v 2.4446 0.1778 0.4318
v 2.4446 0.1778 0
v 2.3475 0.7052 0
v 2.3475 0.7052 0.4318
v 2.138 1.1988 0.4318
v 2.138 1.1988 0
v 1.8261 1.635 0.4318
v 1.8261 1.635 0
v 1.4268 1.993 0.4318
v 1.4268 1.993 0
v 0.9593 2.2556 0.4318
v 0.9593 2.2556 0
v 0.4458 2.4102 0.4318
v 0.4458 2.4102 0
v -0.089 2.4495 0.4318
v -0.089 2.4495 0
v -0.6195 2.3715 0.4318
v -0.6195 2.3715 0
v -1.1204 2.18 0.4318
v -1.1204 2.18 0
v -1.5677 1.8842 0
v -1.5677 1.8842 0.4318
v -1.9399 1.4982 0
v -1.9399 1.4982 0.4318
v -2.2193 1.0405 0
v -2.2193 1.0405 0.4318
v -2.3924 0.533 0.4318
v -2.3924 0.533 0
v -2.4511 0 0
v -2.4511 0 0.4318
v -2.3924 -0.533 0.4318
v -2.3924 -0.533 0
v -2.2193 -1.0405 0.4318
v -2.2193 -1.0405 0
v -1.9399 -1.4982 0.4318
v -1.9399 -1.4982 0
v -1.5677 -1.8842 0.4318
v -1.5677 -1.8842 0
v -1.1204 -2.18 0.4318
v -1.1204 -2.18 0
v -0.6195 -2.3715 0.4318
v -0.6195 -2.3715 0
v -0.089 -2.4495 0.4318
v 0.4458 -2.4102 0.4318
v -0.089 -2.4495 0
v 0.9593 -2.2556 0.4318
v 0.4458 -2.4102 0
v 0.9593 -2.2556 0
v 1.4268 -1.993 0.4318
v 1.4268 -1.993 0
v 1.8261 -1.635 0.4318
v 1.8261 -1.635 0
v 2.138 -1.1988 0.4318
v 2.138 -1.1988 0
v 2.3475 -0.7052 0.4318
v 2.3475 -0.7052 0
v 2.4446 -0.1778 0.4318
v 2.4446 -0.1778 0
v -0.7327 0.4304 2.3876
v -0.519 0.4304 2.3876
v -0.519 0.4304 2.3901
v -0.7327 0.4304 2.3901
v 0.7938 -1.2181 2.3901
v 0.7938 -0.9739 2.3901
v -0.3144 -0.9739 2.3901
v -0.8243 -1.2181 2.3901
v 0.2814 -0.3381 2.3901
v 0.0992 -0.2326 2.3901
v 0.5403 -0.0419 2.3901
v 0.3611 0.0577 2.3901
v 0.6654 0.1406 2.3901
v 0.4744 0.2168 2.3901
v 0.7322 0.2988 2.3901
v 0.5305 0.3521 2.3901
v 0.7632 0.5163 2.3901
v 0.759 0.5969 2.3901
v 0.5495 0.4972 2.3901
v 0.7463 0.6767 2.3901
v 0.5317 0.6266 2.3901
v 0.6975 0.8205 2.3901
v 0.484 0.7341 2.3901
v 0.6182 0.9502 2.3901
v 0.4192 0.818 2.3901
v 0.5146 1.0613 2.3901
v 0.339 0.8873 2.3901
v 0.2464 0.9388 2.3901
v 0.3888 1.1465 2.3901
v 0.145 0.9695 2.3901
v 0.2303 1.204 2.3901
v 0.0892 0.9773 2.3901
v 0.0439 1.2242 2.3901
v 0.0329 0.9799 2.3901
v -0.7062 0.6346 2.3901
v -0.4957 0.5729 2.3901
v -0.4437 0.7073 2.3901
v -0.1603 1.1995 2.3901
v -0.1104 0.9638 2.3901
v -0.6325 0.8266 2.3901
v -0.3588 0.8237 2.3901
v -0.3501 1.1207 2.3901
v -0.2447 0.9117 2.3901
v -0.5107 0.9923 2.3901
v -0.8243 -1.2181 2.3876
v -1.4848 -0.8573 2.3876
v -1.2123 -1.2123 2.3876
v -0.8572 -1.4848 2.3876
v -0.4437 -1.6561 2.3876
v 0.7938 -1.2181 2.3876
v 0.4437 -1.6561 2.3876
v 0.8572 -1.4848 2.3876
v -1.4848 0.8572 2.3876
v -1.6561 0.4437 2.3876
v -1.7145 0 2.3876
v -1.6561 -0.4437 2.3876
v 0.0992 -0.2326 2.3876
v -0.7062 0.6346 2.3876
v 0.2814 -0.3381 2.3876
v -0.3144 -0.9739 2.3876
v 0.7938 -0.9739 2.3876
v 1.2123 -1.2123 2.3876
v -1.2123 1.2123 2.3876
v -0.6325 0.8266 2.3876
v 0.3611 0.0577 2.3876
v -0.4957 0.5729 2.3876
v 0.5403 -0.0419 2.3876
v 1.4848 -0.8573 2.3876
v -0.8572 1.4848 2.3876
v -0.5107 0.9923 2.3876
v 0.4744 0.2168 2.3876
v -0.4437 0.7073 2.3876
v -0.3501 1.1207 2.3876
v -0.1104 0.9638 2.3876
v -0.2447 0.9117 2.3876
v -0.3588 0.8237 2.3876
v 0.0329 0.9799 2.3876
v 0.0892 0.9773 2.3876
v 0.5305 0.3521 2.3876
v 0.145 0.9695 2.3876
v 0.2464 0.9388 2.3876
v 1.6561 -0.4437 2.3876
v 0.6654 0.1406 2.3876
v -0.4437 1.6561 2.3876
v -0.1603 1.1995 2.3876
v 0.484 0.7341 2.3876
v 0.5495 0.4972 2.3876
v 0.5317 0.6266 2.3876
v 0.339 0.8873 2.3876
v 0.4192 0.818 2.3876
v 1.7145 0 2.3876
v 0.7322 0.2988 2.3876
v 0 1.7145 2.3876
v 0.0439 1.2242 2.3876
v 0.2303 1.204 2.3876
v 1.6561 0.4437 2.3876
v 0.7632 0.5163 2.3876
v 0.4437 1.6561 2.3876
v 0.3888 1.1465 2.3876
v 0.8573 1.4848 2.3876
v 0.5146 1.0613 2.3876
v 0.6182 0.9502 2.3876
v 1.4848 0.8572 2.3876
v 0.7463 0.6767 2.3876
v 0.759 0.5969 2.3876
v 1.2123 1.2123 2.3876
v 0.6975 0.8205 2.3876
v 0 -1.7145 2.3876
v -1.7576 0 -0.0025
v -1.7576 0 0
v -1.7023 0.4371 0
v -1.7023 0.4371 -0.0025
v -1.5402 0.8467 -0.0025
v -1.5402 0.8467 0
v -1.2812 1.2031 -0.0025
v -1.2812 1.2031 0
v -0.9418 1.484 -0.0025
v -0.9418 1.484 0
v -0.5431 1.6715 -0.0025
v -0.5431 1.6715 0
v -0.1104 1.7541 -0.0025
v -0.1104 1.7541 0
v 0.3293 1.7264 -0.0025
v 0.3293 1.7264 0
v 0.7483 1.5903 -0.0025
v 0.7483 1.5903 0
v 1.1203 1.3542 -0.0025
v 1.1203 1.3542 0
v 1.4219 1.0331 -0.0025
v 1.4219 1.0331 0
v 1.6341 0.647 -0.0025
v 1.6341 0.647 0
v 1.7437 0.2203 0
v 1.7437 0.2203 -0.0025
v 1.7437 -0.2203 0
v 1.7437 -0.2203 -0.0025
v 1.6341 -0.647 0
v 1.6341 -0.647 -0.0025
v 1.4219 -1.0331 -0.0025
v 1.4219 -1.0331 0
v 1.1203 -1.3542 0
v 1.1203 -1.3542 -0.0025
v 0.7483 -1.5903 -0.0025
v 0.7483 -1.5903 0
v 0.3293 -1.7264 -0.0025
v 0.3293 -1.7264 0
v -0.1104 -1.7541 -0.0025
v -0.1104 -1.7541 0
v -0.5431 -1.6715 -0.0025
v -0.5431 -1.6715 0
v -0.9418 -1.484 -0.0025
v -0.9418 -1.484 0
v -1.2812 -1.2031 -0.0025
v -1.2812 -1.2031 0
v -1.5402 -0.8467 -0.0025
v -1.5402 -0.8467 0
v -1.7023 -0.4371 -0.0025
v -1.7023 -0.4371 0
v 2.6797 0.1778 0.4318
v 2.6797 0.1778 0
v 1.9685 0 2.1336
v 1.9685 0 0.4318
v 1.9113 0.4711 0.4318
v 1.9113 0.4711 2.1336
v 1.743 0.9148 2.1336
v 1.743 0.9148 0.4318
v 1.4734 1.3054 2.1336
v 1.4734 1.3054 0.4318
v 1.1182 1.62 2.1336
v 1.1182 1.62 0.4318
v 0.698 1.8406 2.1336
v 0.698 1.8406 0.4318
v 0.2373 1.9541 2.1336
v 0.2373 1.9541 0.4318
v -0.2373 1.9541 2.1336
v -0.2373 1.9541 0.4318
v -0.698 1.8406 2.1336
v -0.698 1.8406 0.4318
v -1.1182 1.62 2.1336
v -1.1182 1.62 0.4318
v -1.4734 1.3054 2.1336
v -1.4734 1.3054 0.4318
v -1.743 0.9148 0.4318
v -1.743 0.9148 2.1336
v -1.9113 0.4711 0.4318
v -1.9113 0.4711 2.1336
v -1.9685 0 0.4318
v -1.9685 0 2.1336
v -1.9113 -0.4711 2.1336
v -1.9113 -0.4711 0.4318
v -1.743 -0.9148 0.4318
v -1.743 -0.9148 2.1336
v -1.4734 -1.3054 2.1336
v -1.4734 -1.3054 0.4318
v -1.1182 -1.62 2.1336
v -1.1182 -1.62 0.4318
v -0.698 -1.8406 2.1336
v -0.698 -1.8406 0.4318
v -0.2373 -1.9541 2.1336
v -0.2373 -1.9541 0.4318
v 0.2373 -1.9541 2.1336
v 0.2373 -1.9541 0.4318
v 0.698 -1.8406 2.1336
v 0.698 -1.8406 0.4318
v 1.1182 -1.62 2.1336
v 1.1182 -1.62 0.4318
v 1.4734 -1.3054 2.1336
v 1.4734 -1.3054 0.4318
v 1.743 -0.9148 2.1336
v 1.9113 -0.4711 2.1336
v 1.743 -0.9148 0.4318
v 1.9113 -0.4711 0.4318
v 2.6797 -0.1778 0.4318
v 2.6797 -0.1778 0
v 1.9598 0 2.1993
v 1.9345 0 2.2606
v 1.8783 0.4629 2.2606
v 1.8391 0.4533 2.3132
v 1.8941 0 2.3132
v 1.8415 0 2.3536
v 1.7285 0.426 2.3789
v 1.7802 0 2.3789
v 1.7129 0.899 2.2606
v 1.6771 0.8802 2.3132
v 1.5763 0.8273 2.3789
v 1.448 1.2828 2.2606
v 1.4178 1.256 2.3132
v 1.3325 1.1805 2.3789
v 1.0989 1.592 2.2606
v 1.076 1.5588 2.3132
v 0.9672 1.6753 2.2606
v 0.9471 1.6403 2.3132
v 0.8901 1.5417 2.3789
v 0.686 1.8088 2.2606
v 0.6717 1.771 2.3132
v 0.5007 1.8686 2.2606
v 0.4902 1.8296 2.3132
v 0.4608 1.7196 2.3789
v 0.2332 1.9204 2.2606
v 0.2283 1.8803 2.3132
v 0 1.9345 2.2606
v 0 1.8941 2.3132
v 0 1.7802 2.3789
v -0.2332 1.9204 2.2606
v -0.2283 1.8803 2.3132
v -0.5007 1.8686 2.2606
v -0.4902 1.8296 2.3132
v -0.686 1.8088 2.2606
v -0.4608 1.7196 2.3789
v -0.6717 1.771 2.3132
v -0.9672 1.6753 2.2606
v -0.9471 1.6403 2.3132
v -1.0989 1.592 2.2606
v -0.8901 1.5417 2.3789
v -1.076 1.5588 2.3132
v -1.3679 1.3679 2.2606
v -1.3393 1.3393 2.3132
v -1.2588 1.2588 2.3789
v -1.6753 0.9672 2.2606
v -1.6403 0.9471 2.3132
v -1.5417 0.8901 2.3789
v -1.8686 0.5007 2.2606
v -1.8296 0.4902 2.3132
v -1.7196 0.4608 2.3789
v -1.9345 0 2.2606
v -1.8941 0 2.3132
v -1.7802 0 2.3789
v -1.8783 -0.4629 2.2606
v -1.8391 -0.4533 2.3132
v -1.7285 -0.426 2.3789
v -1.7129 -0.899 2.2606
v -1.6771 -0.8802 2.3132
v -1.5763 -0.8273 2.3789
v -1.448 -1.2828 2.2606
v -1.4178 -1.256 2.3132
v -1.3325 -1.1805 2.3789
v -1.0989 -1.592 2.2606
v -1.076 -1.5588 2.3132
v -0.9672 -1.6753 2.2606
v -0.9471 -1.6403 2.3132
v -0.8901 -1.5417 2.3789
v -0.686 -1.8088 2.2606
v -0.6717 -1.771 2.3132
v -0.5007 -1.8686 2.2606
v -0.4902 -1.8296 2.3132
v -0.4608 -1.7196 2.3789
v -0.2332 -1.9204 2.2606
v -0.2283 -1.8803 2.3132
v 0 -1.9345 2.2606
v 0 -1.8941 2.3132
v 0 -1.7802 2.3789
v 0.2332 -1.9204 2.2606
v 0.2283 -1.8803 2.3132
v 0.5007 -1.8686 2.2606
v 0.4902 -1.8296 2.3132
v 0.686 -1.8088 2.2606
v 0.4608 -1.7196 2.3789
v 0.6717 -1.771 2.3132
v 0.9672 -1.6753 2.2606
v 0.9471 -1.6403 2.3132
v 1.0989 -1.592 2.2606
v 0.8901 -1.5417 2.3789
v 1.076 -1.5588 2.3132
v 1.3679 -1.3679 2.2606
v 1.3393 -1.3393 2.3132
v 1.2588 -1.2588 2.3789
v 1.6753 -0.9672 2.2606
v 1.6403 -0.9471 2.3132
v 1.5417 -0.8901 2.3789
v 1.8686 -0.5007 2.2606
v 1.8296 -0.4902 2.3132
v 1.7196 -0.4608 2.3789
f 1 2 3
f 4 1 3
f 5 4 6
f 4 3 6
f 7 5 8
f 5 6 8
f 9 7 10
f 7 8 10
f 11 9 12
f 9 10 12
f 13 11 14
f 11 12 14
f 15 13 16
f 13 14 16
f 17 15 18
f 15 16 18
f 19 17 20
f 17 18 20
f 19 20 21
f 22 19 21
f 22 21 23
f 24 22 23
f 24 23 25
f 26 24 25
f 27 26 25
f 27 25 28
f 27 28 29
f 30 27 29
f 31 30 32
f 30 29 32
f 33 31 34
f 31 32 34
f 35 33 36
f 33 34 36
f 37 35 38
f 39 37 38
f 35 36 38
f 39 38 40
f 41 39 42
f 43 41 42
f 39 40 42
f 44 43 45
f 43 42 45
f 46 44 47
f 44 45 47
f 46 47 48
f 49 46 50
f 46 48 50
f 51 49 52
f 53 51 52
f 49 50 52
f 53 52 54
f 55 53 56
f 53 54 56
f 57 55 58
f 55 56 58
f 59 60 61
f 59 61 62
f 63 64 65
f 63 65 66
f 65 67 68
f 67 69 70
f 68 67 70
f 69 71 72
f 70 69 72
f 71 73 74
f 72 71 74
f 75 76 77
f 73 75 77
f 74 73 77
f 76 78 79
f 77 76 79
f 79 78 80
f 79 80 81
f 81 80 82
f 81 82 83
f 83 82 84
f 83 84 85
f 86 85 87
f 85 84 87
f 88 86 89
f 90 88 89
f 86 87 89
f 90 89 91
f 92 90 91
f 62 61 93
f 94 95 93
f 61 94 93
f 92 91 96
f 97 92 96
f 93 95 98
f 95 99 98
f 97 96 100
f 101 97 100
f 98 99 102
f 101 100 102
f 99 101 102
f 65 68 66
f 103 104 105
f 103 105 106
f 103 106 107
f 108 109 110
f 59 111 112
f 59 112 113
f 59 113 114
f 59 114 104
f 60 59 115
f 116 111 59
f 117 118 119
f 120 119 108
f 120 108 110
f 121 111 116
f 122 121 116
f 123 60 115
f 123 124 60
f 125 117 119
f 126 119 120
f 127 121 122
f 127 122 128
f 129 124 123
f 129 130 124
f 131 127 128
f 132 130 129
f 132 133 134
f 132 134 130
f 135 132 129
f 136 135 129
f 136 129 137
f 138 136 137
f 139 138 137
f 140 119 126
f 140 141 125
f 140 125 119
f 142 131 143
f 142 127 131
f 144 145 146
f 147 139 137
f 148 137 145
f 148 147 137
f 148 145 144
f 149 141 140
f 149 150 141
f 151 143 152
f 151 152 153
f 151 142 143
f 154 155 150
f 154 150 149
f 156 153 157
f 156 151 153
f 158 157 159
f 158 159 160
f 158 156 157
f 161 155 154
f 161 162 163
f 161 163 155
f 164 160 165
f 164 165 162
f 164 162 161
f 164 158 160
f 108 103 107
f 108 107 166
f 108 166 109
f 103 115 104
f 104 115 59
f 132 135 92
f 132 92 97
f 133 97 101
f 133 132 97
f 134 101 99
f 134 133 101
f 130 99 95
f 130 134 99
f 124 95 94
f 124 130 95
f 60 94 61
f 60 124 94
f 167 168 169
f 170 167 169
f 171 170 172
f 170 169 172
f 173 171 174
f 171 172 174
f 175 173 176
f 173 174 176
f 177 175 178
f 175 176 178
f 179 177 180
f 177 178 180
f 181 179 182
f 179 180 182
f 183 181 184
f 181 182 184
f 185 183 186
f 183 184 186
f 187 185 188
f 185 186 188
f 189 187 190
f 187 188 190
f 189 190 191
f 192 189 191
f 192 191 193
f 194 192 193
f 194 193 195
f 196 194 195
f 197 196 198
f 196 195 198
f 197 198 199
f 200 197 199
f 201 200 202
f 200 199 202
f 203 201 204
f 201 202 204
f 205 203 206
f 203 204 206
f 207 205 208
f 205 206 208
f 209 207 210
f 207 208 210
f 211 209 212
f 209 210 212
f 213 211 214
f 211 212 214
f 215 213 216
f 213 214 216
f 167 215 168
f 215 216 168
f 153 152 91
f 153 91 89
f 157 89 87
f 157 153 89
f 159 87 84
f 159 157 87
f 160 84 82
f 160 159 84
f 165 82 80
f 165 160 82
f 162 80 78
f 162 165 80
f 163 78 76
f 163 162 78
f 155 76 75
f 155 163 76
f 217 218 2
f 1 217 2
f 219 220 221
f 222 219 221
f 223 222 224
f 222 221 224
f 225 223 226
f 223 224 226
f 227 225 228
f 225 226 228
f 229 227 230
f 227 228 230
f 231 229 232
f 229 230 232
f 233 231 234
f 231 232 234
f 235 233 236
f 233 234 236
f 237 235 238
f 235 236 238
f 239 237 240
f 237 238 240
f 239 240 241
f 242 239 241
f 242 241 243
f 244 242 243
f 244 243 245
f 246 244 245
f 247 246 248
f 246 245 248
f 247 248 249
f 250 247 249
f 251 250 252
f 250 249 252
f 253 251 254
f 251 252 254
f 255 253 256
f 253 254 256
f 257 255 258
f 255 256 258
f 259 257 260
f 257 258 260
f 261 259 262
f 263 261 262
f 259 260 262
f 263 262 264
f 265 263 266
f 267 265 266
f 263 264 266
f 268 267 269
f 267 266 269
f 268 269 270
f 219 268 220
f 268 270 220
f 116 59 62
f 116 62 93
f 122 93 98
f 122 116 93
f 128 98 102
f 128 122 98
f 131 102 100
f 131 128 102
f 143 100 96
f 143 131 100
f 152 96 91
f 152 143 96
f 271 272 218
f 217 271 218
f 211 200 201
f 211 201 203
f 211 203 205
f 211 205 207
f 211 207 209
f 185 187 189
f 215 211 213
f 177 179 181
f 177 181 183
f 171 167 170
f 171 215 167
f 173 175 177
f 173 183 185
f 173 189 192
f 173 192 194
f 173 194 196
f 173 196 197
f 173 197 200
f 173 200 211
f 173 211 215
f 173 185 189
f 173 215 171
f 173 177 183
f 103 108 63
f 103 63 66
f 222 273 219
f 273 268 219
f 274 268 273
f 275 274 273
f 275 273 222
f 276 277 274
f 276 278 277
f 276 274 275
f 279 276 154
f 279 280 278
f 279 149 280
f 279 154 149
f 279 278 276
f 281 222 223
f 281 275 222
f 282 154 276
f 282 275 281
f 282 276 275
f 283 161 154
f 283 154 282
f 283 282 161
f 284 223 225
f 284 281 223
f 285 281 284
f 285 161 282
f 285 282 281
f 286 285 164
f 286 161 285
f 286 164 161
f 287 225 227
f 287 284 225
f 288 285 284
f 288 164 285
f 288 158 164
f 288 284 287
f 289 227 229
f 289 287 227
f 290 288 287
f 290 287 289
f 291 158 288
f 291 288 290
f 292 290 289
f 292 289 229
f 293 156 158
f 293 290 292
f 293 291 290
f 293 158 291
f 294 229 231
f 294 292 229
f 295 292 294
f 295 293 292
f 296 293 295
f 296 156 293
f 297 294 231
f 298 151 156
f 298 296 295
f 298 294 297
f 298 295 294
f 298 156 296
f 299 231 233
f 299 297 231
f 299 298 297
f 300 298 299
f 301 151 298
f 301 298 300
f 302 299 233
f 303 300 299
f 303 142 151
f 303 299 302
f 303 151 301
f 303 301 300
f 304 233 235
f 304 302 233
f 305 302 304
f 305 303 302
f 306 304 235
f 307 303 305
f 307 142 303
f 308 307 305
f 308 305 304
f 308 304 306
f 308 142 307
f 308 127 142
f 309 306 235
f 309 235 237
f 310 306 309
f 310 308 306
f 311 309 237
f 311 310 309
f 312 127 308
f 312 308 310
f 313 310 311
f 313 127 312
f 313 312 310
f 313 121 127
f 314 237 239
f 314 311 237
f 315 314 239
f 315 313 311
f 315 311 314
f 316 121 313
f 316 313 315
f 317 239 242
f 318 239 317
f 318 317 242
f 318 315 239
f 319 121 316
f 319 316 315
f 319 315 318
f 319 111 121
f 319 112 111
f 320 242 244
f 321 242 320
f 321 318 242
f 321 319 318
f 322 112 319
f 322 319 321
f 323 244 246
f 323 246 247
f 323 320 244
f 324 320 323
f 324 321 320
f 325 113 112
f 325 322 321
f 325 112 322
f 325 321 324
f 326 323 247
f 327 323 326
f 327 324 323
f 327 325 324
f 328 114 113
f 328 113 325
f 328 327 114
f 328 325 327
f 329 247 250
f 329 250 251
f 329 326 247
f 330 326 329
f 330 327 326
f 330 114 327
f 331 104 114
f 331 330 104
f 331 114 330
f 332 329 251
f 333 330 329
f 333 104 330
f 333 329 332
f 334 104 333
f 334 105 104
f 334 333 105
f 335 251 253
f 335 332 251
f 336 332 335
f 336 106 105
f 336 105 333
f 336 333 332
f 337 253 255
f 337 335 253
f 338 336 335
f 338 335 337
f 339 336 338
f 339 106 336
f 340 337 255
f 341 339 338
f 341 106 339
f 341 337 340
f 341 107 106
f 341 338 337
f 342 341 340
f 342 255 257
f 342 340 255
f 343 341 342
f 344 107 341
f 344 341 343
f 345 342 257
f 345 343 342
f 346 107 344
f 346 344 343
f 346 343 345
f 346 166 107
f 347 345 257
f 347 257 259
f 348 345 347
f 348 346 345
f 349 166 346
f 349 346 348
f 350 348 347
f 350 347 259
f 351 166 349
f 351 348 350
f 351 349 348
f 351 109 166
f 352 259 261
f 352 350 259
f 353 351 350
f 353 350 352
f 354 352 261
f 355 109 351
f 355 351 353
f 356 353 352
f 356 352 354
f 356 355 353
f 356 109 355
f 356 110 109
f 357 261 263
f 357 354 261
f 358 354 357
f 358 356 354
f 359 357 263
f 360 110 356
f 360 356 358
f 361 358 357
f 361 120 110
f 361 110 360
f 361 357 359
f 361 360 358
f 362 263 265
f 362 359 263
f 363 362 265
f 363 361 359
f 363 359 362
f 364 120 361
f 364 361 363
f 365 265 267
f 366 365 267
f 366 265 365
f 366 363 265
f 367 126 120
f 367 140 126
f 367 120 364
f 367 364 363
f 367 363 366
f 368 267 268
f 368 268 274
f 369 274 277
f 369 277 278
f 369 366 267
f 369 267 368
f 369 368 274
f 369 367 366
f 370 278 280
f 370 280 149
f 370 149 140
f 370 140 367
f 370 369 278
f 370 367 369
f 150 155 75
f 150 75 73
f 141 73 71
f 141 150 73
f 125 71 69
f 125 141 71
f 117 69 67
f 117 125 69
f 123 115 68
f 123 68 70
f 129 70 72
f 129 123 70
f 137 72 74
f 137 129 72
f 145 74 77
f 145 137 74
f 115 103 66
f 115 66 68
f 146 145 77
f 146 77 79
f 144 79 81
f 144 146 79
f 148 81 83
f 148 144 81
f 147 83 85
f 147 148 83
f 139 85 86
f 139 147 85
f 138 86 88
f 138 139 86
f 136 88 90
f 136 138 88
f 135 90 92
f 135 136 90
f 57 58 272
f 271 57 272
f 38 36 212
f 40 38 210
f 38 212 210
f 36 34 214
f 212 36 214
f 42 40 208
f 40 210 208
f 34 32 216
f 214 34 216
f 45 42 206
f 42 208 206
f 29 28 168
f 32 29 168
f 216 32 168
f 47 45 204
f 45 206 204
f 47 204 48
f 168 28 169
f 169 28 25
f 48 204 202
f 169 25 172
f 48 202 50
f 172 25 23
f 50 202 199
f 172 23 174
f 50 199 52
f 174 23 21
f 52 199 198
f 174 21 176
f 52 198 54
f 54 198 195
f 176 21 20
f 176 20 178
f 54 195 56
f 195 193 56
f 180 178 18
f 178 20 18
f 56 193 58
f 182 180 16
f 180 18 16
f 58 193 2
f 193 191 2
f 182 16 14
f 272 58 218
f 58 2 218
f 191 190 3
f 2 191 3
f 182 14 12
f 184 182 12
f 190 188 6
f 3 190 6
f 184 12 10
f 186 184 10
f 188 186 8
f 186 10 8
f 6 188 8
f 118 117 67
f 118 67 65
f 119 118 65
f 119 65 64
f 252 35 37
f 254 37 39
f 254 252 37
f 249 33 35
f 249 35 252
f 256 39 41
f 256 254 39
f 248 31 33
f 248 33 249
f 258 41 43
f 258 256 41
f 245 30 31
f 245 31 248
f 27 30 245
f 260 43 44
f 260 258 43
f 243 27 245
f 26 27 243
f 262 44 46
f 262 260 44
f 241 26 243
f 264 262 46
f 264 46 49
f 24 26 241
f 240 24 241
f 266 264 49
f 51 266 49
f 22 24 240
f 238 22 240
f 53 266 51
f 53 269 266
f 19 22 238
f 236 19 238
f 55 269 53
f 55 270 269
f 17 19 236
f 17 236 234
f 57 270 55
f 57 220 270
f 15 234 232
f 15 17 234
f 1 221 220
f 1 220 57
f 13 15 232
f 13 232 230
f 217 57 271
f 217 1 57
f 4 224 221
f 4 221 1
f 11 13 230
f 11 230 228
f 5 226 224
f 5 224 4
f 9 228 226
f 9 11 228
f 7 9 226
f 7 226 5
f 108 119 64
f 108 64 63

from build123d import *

# Parameters (mm, degrees)
BOSS_EXTRUDE1_DEPTH = 0.4318
SKETCH2_R           = 1.9685
BOSS_EXTRUDE2_DEPTH = 1.9558
SKETCH3_R           = 1.757566481
BOSS_EXTRUDE3_DEPTH = 0.00254
FILLET1_R           = 0.254
BOSS_EXTRUDE5_DEPTH = 0.00254


with BuildPart() as part:
    # Sketch1 → Boss-Extrude1 (new body)
    with BuildSketch(Plane.XY):
        with BuildLine():
            Line((2.6797, 0.1778), (2.4511, 0.1778))
            Line((2.4511, 0.1778), (2.44464279, 0.1778))
            ThreePointArc((2.44464279, 0.1778), (-2.4511, 0), (2.44464279, -0.1778))
            Line((2.44464279, -0.1778), (2.4511, -0.1778))
            Line((2.4511, -0.1778), (2.6797, -0.1778))
            Line((2.6797, -0.1778), (2.6797, 0.1778))
        make_face()
    extrude(amount=BOSS_EXTRUDE1_DEPTH)

    # Sketch2 → Boss-Extrude2 (add)
    with BuildSketch(Plane.XY.offset(0.4318)):
        Circle(SKETCH2_R)
    extrude(amount=BOSS_EXTRUDE2_DEPTH)

    # Sketch3 → Boss-Extrude3 (add)
    with BuildSketch(Plane(origin=(0, 0, 0), x_dir=(-1, 0, 0), z_dir=(0, 0, -1))):
        Circle(SKETCH3_R)
    extrude(amount=BOSS_EXTRUDE3_DEPTH)

    # Fillet1
    fillet1_edges = [part.edges().sort_by_distance(p)[0] for p in [
        (-1.9685, 0, 2.3876),
    ]]
    fillet(fillet1_edges, radius=FILLET1_R)

    # Sketch4 → Boss-Extrude5 (add)
    with BuildSketch(Plane.XY.offset(2.3876)):
        with BuildLine():
            Line((-0.518990385, 0.430416485), (-0.732692308, 0.430416485))
            add(Edge.make_bspline(
                [(-0.732692308, 0.430416485), (-0.731299513, 0.458767572), (-0.7285641, 0.51444835), (-0.715754139, 0.595631222), (-0.697424721, 0.673229219), (-0.671508928, 0.746619286), (-0.639323764, 0.816450331), (-0.600727084, 0.882444985), (-0.555011268, 0.94435149), (-0.503163472, 1.001595953), (-0.446851238, 1.054111068), (-0.386091304, 1.099460439), (-0.322243169, 1.137776569), (-0.255500542, 1.169808628), (-0.185110409, 1.193852344), (-0.111711536, 1.211692424), (-0.034981445, 1.222425974), (0.017297213, 1.223579714), (0.043885216, 1.224166485)],
                knots=[0, 0, 0, 0, 8.5101e-05, 0.000167136, 0.000246156, 0.000324002, 0.000400196, 0.000476525, 0.000552946, 0.00063063, 0.000707931, 0.000783585, 0.000857621, 0.000931021, 0.001005242, 0.001080329, 0.001157369, 0.0012371, 0.0012371, 0.0012371, 0.0012371], degree=3))
            add(Edge.make_bspline(
                [(0.043885216, 1.224166485), (0.069996013, 1.223555214), (0.121302796, 1.222354088), (0.196184274, 1.212039173), (0.267470255, 1.19588369), (0.335021396, 1.173217309), (0.398298736, 1.142747904), (0.457777629, 1.106146364), (0.514166181, 1.063814658), (0.564925439, 1.013975902), (0.6115354, 0.960770351), (0.651746041, 0.90396876), (0.686181069, 0.845302049), (0.714883758, 0.784322862), (0.736013024, 0.720457038), (0.752054626, 0.654634387), (0.761122027, 0.586173578), (0.762513646, 0.539836797), (0.763221154, 0.516278865)],
                knots=[0, 0, 0, 0, 7.8301e-05, 0.000153859, 0.000226296, 0.000297346, 0.000367115, 0.000436491, 0.000506613, 0.000578134, 0.000649483, 0.000718576, 0.000786562, 0.000853361, 0.000920337, 0.00098802, 0.00105636, 0.001127037, 0.001127037, 0.001127037, 0.001127037], degree=3))
            add(Edge.make_bspline(
                [(0.763221154, 0.516278865), (0.76206913, 0.483112928), (0.7597853, 0.417363068), (0.740249269, 0.320742242), (0.709737624, 0.227129576), (0.673000137, 0.151788662), (0.635939421, 0.091078017), (0.602542384, 0.041093059), (0.56344579, -0.012726912), (0.518080597, -0.070201671), (0.467385232, -0.131781412), (0.410900511, -0.197428934), (0.348223642, -0.266465977), (0.304232769, -0.313618538), (0.2814378, -0.338051814)],
                knots=[0, 0, 0, 0, 9.9412e-05, 0.00019708, 0.000294526, 0.000394158, 0.00044766, 0.000507857, 0.000574456, 0.000647169, 0.000727484, 0.000813734, 0.000906948, 0.001007195, 0.001007195, 0.001007195, 0.001007195], degree=3))
            Line((0.2814378, -0.338051814), (-0.314351713, -0.973910438))
            Line((-0.314351713, -0.973910438), (0.79375, -0.973910438))
            Line((0.79375, -0.973910438), (0.79375, -1.218141207))
            Line((0.79375, -1.218141207), (-0.824278846, -1.218141207))
            Line((-0.824278846, -1.218141207), (0.09921875, -0.232631892))
            add(Edge.make_bspline(
                [(0.09921875, -0.232631892), (0.121703116, -0.209160723), (0.164890981, -0.16407741), (0.225975199, -0.098257646), (0.28083851, -0.037195905), (0.329836058, 0.018992443), (0.371904925, 0.071129278), (0.40923764, 0.117526031), (0.439149944, 0.16022147), (0.471613454, 0.209711066), (0.503055466, 0.27013516), (0.530074051, 0.343976831), (0.546548796, 0.419991266), (0.548525122, 0.471359616), (0.549519231, 0.497198336)],
                knots=[0, 0, 0, 0, 9.7508e-05, 0.000187293, 0.000269374, 0.000343776, 0.000410901, 0.000470352, 0.000522366, 0.00056722, 0.000647868, 0.000726034, 0.000802562, 0.000880016, 0.000880016, 0.000880016, 0.000880016], degree=3))
            add(Edge.make_bspline(
                [(0.549519231, 0.497198336), (0.549086699, 0.513446216), (0.548234262, 0.545467668), (0.540711078, 0.592416229), (0.529341966, 0.637704075), (0.513050639, 0.681470511), (0.491546767, 0.723275499), (0.465371129, 0.763169928), (0.435170032, 0.80173867), (0.400232829, 0.837901896), (0.361852849, 0.871022502), (0.321307475, 0.900362281), (0.278410886, 0.924881748), (0.233343946, 0.944981877), (0.186232296, 0.960749413), (0.136984818, 0.971674983), (0.085737585, 0.978534673), (0.050744439, 0.979462797), (0.032913912, 0.979935716)],
                knots=[0, 0, 0, 0, 4.8714e-05, 9.6005e-05, 0.000142283, 0.000188622, 0.000235769, 0.000283003, 0.000331577, 0.000382519, 0.000433586, 0.000483493, 0.000532423, 0.000581535, 0.000631314, 0.000681191, 0.000732666, 0.000786145, 0.000786145, 0.000786145, 0.000786145], degree=3))
            add(Edge.make_bspline(
                [(0.032913912, 0.979935716), (0.014291971, 0.979449239), (-0.022278448, 0.978493878), (-0.075971576, 0.971810958), (-0.127192792, 0.960281735), (-0.176070944, 0.944513319), (-0.222688734, 0.924470984), (-0.266819449, 0.899507494), (-0.308364022, 0.869719082), (-0.34740055, 0.835945775), (-0.383366935, 0.798344067), (-0.414967399, 0.756427289), (-0.442579023, 0.710960779), (-0.466669948, 0.662067219), (-0.486234087, 0.609302951), (-0.501183677, 0.55285528), (-0.513012942, 0.492969305), (-0.516964811, 0.451613738), (-0.518990385, 0.430416485)],
                knots=[0, 0, 0, 0, 5.5861e-05, 0.000109703, 0.000162011, 0.00021315, 0.000263571, 0.000313981, 0.000364941, 0.000416681, 0.000468643, 0.000520734, 0.000573828, 0.000628015, 0.000684013, 0.000742333, 0.000803049, 0.000866894, 0.000866894, 0.000866894, 0.000866894], degree=3))
        make_face()
    extrude(amount=BOSS_EXTRUDE5_DEPTH)


solid = part.part
